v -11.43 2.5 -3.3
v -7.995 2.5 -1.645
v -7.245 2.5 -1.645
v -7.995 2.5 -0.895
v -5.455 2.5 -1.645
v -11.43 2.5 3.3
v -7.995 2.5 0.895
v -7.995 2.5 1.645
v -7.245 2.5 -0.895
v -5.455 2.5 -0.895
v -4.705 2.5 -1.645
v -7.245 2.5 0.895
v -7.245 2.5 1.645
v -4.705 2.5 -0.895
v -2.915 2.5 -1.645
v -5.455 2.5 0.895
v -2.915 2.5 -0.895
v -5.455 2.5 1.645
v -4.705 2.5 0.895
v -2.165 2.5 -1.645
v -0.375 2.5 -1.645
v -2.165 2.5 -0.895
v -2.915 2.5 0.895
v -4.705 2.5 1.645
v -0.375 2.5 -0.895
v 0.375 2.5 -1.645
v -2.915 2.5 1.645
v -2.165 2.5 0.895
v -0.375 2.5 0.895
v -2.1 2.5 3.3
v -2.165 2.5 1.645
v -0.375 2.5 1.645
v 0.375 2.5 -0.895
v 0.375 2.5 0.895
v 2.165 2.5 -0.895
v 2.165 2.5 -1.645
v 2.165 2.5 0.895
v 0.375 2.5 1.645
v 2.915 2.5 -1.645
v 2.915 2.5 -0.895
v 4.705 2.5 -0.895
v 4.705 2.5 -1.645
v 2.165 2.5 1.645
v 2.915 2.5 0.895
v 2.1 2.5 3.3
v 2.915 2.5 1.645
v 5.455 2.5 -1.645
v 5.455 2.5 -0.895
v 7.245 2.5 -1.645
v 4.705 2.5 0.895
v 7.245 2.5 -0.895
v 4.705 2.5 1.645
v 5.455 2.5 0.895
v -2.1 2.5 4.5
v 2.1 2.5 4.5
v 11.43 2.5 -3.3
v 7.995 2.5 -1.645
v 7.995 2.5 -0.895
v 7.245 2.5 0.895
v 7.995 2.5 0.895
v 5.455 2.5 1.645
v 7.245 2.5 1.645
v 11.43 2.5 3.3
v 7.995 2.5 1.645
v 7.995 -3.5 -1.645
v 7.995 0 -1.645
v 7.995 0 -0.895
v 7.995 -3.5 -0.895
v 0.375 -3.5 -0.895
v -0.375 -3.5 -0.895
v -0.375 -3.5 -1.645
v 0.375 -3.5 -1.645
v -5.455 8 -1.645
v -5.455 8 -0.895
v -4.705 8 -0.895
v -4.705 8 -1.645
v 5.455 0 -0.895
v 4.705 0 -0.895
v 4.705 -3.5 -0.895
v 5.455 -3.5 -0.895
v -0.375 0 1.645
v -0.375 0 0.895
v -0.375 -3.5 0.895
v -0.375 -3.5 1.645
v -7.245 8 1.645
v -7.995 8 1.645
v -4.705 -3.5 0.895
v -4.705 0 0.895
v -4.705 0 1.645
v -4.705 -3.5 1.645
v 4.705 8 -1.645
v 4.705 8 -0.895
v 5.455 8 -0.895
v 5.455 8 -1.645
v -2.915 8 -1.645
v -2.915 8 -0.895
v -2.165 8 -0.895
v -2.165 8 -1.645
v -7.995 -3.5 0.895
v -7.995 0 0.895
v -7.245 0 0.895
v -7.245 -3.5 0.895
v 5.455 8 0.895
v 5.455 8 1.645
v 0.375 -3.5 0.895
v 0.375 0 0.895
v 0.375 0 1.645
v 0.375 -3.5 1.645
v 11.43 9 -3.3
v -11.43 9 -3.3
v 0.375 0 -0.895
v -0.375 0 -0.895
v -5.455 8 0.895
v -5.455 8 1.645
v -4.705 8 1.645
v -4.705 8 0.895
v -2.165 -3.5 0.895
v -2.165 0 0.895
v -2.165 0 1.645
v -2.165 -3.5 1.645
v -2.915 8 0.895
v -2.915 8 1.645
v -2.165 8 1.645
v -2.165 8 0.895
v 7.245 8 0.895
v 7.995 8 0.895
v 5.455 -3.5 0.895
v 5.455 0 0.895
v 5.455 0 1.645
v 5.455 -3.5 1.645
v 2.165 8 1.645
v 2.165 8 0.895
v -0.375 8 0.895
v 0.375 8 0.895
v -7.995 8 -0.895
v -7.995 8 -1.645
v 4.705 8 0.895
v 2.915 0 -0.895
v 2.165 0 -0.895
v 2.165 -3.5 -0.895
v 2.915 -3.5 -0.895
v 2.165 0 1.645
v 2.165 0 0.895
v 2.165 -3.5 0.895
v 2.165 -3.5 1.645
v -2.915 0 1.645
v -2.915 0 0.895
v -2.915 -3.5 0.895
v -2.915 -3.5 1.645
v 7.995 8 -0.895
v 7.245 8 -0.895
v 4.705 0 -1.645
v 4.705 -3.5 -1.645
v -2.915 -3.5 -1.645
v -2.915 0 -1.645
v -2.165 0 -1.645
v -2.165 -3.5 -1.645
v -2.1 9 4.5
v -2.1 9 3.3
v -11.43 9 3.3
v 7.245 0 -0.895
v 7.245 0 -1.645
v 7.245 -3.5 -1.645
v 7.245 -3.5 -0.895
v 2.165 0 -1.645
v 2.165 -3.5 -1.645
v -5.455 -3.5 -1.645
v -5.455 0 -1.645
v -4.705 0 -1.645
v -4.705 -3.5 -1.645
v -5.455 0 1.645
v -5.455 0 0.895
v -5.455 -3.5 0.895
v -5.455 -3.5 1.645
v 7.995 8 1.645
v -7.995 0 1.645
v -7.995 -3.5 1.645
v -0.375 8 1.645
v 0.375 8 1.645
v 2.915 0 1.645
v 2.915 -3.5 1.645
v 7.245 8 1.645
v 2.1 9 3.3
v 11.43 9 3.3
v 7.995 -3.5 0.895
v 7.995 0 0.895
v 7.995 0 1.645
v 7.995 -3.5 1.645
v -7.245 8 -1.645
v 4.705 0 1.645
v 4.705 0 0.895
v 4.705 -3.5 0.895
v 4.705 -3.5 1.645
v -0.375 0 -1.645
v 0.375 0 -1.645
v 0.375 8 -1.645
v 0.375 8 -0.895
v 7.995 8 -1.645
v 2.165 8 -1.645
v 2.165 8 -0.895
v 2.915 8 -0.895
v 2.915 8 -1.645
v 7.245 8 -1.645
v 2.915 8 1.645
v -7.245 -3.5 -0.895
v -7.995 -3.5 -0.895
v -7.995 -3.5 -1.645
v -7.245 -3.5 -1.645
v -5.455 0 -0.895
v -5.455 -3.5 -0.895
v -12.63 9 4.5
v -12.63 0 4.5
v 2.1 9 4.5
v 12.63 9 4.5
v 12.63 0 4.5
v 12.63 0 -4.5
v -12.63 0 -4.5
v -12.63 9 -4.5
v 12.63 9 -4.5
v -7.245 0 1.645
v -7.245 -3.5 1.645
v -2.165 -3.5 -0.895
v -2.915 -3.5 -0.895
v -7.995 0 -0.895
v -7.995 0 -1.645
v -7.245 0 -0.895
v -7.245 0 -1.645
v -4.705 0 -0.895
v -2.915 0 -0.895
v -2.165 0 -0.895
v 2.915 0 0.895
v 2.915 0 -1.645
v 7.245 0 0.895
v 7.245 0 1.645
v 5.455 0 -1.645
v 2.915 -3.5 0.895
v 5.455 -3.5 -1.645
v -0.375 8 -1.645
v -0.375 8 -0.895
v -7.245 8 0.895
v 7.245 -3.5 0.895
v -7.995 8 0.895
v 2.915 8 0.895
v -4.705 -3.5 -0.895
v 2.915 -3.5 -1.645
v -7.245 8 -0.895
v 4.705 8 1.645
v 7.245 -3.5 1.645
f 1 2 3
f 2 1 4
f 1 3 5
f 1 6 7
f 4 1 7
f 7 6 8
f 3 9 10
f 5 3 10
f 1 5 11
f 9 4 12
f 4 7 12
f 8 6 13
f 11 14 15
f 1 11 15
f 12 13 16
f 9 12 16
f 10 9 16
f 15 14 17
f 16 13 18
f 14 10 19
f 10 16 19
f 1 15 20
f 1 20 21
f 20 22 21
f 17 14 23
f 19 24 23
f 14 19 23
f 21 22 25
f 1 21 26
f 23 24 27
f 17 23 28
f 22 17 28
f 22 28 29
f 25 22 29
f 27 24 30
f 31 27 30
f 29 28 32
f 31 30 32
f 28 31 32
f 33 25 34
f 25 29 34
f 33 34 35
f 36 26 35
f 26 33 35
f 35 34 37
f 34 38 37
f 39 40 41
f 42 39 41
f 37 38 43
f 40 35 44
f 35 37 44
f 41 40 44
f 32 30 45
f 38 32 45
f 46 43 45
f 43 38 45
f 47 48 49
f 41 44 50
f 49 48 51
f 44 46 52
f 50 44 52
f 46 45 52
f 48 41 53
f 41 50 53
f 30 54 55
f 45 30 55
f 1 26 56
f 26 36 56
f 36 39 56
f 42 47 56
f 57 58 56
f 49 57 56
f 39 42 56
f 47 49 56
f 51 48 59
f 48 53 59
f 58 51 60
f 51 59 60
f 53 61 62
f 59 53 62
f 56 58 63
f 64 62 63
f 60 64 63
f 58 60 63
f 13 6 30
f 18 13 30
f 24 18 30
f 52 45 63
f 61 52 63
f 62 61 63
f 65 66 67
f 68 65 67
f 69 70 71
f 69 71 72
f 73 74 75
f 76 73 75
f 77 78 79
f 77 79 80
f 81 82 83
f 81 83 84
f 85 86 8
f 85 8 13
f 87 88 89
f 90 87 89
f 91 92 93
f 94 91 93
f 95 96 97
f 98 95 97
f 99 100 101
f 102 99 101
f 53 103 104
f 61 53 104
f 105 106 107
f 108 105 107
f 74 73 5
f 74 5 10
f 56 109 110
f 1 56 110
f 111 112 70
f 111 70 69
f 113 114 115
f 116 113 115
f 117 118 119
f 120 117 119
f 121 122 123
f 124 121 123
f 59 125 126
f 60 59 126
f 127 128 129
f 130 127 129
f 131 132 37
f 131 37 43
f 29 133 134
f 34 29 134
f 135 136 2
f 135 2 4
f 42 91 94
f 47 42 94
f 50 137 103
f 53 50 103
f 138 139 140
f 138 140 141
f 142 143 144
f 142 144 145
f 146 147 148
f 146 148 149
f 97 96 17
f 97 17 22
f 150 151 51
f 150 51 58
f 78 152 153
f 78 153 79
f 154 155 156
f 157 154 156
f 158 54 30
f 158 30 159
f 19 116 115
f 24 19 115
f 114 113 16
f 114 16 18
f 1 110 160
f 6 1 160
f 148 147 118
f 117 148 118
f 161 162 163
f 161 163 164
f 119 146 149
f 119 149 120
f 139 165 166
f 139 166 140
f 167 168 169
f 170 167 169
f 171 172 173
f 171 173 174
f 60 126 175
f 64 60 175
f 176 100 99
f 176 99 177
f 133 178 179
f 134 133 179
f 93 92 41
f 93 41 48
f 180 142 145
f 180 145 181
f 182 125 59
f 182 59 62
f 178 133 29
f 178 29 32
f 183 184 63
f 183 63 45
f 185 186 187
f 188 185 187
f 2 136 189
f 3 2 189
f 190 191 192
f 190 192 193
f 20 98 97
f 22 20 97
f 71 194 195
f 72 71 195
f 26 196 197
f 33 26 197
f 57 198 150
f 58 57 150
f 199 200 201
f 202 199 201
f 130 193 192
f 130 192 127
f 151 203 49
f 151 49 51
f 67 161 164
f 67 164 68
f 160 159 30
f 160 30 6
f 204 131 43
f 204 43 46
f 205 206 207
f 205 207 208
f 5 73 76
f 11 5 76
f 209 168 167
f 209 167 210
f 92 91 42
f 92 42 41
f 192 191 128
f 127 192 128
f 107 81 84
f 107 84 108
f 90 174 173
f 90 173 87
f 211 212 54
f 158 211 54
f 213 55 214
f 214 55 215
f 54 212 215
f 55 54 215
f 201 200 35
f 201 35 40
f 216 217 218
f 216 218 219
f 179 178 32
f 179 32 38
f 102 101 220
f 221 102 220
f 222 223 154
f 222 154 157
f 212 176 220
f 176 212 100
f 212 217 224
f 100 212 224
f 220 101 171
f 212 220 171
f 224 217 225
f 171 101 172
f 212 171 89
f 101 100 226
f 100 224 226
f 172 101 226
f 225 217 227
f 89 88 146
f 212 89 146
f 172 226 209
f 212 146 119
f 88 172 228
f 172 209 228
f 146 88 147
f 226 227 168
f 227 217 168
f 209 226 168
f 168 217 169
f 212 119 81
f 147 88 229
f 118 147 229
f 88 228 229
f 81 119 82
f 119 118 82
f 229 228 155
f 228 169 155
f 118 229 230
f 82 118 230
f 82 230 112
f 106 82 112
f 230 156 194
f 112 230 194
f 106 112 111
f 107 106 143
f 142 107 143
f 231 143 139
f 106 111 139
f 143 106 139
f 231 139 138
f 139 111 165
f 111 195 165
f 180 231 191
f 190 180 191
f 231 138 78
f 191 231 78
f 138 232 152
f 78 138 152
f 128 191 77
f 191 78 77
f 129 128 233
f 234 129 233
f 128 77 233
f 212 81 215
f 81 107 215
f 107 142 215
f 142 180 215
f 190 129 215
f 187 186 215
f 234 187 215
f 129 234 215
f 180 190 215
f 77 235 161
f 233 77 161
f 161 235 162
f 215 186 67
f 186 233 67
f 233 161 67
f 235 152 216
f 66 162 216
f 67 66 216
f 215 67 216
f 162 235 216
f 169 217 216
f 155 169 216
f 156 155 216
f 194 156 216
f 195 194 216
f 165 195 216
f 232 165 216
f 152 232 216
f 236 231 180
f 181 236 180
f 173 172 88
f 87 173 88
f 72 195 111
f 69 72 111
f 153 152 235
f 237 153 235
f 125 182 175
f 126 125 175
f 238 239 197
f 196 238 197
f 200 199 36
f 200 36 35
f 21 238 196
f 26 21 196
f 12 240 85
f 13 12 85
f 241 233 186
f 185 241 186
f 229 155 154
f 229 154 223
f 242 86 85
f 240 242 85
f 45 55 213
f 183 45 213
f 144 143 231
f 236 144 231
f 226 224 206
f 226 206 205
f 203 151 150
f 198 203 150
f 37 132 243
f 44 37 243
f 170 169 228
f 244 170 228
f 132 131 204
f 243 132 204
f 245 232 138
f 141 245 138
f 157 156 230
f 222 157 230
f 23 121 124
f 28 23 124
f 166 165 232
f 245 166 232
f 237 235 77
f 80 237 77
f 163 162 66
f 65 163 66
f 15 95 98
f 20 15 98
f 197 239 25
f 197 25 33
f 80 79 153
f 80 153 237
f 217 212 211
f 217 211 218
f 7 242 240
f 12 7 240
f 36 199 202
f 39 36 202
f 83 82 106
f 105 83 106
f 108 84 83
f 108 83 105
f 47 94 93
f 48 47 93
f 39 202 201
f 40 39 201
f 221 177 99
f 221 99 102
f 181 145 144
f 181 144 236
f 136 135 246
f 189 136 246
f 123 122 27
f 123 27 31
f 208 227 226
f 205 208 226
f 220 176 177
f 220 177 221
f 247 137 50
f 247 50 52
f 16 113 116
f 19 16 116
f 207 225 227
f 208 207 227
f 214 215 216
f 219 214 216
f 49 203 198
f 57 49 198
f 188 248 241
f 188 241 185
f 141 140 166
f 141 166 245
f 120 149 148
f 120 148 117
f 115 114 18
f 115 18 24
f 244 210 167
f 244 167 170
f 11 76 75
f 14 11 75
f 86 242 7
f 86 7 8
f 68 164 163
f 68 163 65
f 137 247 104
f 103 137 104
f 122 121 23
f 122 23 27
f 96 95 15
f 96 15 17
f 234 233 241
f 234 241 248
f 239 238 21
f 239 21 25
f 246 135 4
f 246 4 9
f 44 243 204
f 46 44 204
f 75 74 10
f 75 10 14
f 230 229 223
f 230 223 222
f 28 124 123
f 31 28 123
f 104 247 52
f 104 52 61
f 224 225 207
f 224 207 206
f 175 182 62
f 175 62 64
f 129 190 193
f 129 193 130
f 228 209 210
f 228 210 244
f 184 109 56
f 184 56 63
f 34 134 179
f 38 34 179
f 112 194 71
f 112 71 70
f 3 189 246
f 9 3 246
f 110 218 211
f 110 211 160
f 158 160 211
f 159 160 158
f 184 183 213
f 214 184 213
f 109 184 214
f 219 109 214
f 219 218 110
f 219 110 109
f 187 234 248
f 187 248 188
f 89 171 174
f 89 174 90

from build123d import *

# Parameters (mm, degrees)
SKETCH_1_W           = 25.26
SKETCH_1_H           = 9
EXTRUDE_1_DEPTH      = 9
SKETCH_2_W           = 22.86
SKETCH_2_H           = 6.6
CUT_EXTRUDE_1_DEPTH  = 6.5
SKETCH_3_W           = 4.2
SKETCH_3_H           = 6.5
CUT_EXTRUDE_2_DEPTH  = 6.5
EXTRUDE_2_DEPTH      = 3.5
EXTRUDE_2_DEPTH_BACK = 8
SKETCH_5_W           = 0.75
SKETCH_5_H           = 0.75


with BuildPart() as part:
    # 草图1 → 拉伸1 (new body)
    with BuildSketch(Plane(origin=(0, 0, 0), x_dir=(1, 0, 0), z_dir=(0, 1, 0))):
        Rectangle(SKETCH_1_W, SKETCH_1_H)
    extrude(amount=EXTRUDE_1_DEPTH)

    # 草图2 → 切除-拉伸1 (cut)
    with BuildSketch(Plane(origin=(0, 9, 0), x_dir=(-1, 0, 0), z_dir=(0, 1, 0))):
        Rectangle(SKETCH_2_W, SKETCH_2_H)
    extrude(amount=-CUT_EXTRUDE_1_DEPTH, mode=Mode.SUBTRACT)

    # 草图3 → 切除-拉伸2 (cut)
    with BuildSketch(Plane.XY.offset(4.5)):
        with Locations((0, 5.75)):
            Rectangle(SKETCH_3_W, SKETCH_3_H)
    extrude(amount=-CUT_EXTRUDE_2_DEPTH, mode=Mode.SUBTRACT)

    # 草图5 → 拉伸2 (add, two sides: drawn at the far end of the back side and taken through both)
    with BuildSketch(Plane.XZ.offset(-EXTRUDE_2_DEPTH_BACK)):
        with Locations((0, 1.27)):
            Rectangle(SKETCH_5_W, SKETCH_5_H)
        with Locations((2.54, 1.27)):
            Rectangle(SKETCH_5_W, SKETCH_5_H)
        with Locations((5.08, 1.27)):
            Rectangle(SKETCH_5_W, SKETCH_5_H)
        with Locations((7.62, 1.27)):
            Rectangle(SKETCH_5_W, SKETCH_5_H)
        with Locations((-2.54, 1.27)):
            Rectangle(SKETCH_5_W, SKETCH_5_H)
        with Locations((-5.08, 1.27)):
            Rectangle(SKETCH_5_W, SKETCH_5_H)
        with Locations((-7.62, 1.27)):
            Rectangle(SKETCH_5_W, SKETCH_5_H)
        with Locations((-7.62, -1.27)):
            Rectangle(SKETCH_5_W, SKETCH_5_H)
        with Locations((-5.08, -1.27)):
            Rectangle(SKETCH_5_W, SKETCH_5_H)
        with Locations((-2.54, -1.27)):
            Rectangle(SKETCH_5_W, SKETCH_5_H)
        with Locations((7.62, -1.27)):
            Rectangle(SKETCH_5_W, SKETCH_5_H)
        with Locations((5.08, -1.27)):
            Rectangle(SKETCH_5_W, SKETCH_5_H)
        with Locations((2.54, -1.27)):
            Rectangle(SKETCH_5_W, SKETCH_5_H)
        with Locations((0, -1.27)):
            Rectangle(SKETCH_5_W, SKETCH_5_H)
    extrude(amount=EXTRUDE_2_DEPTH + EXTRUDE_2_DEPTH_BACK)


solid = part.part
